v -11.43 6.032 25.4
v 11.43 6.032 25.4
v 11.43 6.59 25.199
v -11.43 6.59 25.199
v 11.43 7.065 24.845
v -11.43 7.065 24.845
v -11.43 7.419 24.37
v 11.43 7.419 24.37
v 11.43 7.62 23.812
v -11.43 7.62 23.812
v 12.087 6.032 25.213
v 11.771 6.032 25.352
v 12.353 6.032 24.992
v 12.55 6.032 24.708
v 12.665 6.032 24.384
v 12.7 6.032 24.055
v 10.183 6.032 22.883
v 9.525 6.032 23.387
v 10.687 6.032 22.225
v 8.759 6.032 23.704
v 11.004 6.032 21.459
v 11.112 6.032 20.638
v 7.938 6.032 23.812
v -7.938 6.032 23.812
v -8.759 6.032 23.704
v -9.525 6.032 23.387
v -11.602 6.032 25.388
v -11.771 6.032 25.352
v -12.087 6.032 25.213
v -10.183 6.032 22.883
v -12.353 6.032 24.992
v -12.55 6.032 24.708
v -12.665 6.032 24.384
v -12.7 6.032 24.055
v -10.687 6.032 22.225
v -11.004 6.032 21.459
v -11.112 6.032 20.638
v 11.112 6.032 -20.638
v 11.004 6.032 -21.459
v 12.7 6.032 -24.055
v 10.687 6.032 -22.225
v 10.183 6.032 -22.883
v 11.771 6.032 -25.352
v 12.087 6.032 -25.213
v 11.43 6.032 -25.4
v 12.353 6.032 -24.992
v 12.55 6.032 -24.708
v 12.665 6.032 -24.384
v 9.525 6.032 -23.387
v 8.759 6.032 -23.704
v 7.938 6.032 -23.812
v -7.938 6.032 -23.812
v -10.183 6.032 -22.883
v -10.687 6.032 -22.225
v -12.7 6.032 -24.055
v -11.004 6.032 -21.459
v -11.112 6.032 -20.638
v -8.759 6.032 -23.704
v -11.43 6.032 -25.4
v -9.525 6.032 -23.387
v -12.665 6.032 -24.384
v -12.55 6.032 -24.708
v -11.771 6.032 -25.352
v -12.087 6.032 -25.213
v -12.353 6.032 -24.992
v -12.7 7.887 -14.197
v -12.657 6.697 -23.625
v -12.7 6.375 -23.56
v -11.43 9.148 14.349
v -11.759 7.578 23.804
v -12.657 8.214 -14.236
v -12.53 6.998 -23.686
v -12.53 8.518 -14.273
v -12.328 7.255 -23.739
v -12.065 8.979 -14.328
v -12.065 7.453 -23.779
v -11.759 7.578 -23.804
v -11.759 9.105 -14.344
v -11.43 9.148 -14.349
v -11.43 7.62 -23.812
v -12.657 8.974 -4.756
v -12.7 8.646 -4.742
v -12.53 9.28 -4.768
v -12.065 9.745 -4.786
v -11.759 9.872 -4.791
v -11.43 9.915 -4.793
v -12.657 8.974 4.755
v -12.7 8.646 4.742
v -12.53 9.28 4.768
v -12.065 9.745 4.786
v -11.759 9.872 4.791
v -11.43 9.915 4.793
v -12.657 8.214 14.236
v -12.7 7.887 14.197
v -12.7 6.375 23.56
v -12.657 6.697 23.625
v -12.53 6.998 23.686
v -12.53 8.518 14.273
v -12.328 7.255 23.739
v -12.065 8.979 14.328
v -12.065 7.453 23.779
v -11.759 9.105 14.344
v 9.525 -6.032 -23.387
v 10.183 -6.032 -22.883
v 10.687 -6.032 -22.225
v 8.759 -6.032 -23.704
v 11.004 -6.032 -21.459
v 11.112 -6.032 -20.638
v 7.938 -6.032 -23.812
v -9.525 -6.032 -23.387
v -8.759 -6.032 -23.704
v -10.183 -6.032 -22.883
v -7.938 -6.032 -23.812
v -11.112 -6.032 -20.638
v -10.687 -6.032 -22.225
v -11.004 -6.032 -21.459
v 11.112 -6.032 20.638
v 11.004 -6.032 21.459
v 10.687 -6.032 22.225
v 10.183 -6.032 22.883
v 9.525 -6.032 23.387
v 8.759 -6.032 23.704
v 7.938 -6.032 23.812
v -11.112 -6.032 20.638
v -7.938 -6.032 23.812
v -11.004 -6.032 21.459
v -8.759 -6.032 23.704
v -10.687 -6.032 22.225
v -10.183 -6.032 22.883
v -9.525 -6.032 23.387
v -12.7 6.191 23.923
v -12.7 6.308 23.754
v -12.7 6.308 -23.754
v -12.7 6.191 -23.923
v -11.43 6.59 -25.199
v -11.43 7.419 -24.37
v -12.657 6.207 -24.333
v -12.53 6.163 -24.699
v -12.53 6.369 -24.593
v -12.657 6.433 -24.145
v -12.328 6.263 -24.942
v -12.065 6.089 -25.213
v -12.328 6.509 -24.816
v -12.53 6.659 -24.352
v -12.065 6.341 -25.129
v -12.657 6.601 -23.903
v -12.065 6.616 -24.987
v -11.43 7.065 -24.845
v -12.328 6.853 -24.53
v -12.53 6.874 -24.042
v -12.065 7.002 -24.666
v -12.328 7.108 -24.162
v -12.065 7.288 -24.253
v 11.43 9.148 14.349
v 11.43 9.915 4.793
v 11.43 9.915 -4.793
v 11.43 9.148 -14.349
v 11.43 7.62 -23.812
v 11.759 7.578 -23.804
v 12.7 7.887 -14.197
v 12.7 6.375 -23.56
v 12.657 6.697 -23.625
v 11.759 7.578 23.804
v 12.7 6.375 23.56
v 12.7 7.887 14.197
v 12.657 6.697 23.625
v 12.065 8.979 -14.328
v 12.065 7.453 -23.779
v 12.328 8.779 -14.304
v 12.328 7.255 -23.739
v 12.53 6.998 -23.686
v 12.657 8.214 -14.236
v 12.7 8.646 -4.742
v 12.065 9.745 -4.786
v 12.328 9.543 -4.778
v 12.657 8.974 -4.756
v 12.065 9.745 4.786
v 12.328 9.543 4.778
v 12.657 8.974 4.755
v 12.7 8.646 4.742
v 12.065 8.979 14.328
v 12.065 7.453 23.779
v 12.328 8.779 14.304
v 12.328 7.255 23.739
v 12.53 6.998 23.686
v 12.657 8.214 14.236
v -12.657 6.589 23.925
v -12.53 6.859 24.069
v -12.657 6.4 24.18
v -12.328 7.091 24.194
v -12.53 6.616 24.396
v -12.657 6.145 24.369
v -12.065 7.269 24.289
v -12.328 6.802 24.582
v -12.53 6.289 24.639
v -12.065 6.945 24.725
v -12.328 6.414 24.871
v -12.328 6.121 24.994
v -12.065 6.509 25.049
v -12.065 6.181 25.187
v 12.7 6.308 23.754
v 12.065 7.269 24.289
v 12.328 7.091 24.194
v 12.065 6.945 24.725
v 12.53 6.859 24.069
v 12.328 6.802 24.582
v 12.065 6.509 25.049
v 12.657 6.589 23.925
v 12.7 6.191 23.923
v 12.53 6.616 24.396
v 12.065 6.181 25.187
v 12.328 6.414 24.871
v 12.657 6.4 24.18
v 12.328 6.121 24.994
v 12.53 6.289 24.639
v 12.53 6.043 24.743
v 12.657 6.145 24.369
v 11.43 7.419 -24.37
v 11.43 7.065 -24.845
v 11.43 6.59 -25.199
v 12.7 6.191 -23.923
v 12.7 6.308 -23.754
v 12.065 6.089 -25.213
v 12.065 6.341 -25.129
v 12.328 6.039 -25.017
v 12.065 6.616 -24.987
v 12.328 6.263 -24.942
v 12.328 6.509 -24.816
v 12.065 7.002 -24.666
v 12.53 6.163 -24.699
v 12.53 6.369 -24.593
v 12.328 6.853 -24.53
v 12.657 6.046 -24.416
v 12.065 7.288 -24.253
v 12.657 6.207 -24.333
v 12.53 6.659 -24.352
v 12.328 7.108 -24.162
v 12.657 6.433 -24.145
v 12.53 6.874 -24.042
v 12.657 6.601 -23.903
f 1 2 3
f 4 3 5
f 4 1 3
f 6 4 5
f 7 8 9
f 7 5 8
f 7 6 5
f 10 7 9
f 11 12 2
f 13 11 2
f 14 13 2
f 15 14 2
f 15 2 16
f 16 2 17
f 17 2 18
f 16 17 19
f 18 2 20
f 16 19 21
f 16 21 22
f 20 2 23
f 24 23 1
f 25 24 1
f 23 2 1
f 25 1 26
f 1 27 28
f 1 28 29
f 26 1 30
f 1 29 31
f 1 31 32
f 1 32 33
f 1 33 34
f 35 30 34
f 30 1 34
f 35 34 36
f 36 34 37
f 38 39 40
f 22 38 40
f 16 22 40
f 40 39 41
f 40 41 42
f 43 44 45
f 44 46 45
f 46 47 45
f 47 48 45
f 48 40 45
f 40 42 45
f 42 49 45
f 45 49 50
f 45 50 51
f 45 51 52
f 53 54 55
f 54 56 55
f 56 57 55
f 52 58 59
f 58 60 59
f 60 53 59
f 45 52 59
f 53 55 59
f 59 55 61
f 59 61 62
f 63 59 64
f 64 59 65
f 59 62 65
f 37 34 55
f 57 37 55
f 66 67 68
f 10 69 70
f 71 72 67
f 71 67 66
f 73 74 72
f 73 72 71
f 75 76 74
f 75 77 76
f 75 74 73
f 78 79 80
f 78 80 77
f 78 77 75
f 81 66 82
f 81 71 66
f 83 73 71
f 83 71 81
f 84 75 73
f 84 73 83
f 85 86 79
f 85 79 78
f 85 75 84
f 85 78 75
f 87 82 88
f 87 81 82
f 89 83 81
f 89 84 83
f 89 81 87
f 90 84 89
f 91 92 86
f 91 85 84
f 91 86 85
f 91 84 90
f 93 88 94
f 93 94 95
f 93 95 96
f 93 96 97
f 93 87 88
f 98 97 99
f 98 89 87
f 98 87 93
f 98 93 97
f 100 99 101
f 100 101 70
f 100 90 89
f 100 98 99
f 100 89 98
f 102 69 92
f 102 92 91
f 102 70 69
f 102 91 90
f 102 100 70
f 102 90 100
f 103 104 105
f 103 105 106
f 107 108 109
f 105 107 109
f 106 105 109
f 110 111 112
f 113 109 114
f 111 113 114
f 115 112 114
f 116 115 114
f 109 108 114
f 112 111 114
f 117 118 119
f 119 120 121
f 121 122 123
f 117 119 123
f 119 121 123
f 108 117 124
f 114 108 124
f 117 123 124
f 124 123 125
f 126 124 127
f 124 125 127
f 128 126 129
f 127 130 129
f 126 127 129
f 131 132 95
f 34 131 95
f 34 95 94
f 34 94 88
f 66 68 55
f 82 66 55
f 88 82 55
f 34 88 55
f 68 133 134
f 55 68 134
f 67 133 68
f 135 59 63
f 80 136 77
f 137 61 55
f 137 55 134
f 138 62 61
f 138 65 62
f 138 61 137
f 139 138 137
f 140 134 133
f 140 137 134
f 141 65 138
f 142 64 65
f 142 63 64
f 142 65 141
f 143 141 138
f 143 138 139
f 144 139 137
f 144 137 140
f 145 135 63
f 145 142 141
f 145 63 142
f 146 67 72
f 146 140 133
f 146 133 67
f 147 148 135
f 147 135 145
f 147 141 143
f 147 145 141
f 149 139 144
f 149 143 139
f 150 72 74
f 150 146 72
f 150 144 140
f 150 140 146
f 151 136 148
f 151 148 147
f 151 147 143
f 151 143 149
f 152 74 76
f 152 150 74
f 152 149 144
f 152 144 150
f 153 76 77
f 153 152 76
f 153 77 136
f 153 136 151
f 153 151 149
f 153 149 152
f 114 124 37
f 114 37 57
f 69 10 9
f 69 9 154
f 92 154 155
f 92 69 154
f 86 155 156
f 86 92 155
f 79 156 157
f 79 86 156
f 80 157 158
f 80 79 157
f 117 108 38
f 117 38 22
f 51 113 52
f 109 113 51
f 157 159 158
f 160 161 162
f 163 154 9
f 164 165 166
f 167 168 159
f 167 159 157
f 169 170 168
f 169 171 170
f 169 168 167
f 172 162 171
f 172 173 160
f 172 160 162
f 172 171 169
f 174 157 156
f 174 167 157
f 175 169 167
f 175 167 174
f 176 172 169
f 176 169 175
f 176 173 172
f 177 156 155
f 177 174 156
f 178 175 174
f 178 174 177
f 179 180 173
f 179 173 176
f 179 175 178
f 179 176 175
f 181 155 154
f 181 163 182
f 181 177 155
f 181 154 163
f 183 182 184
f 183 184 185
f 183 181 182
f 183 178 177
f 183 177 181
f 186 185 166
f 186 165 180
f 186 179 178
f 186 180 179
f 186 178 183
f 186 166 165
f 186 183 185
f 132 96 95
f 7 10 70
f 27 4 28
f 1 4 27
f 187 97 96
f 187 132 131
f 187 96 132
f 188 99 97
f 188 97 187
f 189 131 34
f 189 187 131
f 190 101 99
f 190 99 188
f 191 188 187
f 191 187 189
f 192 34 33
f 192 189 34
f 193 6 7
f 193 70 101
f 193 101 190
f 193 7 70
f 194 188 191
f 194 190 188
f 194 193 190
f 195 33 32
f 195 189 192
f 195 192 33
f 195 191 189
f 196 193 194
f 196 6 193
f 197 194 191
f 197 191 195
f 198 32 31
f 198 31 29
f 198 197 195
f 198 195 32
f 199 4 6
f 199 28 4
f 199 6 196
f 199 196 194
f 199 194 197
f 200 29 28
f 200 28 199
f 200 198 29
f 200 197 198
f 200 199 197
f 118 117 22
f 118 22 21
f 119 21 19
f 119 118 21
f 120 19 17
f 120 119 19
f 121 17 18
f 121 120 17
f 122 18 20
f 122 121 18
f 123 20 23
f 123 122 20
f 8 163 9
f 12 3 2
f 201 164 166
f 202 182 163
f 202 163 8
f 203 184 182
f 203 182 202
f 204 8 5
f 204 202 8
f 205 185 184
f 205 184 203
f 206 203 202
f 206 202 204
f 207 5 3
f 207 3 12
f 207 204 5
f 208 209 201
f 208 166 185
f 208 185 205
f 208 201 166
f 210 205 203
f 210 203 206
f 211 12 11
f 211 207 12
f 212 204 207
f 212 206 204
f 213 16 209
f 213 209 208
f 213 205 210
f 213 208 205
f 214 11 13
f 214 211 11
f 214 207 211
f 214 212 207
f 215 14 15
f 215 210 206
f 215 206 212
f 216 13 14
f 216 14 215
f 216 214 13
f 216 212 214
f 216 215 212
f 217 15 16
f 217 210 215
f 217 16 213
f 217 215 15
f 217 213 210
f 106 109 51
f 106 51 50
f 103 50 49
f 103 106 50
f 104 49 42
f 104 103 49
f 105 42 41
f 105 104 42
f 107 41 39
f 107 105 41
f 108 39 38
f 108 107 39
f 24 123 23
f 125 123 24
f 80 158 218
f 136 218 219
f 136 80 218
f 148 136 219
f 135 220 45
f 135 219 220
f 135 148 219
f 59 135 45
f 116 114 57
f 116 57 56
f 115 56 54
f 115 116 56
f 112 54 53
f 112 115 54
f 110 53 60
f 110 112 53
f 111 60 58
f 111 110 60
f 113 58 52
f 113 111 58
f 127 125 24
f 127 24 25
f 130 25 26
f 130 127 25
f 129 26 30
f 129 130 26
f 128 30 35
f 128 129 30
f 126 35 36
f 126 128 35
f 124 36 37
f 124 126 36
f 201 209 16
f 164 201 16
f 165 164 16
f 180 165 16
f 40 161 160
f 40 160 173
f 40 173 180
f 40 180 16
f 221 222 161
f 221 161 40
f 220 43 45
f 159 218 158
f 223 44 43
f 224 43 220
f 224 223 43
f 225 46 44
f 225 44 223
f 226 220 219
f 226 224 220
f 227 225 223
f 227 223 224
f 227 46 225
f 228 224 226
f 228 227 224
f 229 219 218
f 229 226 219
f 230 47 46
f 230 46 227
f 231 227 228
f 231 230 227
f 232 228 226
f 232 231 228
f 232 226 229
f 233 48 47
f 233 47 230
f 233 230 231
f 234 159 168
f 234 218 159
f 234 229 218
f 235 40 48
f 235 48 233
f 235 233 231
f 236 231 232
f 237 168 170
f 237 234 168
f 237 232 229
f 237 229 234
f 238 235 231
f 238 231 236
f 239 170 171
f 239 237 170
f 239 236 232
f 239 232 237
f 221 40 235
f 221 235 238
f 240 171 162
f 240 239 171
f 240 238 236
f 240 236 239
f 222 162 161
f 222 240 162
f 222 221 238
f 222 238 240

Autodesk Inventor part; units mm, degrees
ref_plane "YZ Plane" through (0, 0, 0) normal (1, 0, 0) x (0, 1, 0)
ref_plane "XZ Plane" through (0, 0, 0) normal (0, 1, 0) x (-1, 0, 0)
ref_plane "XY Plane" through (0, 0, 0) normal (0, 0, 1) x (1, 0, 0)
sketch "Sketch1" plane through (0, 0, 0) normal (0, 1, 0) x (-1, 0, 0)
  line L0 (-7.9375, 23.8125) -> (7.9375, 23.8125)
  line L1 (11.1125, 20.6375) -> (11.1125, -20.6375)
  line L2 (7.9375, -23.8125) -> (-7.9375, -23.8125)
  line L3 (-11.1125, -20.6375) -> (-11.1125, 20.6375)
  line L4 (-11.1125, 23.8125) -> (11.1125, -23.8125) construction
  line L5 (11.1125, 23.8125) -> (-11.1125, -23.8125) construction
  arc A0 (7.9375, -23.8125) -> (11.1125, -20.6375) centre (7.9375, -20.6375) ccw
  arc A1 (-11.1125, -20.6375) -> (-7.9375, -23.8125) centre (-7.9375, -20.6375) ccw
  arc A2 (-7.9375, 23.8125) -> (-11.1125, 20.6375) centre (-7.9375, 20.6375) ccw
  arc A3 (11.1125, 20.6375) -> (7.9375, 23.8125) centre (7.9375, 20.6375) ccw
  point P0 (0, 0)
  dimension "d0" = 47.625
  dimension "d1" = 22.225
  dimension "d15" = 3.175
extrude "Extrusion1" add sketch "Sketch1" along normal mid plane 12.065
sketch "Sketch3" plane through (0, -6.0325, -23.8125) normal (1, 0, 0) x (0, 0, -1)
  line L0 (-44.45, 12.065) -> (-3.175, 12.065) projected
  line L1 (-3.175, 0) -> (-44.45, 0) projected
  line L2 (-49.2125, 12.065) -> (1.5875, 12.065)
  arc A0 (-47.625, 13.6525) -> (-49.2125, 12.065) centre (-47.2211, 11.6611) ccw
  arc A1 (1.5875, 12.065) -> (0, 13.6525) centre (-0.4039, 11.6611) ccw
  arc A2 (0, 13.6525) -> (-47.625, 13.6525) centre (-23.8125, -103.7429) ccw
  line L3 (-3.175, 12.065) -> (-3.175, 0) projected
  line L4 (-44.45, 12.065) -> (-44.45, 0) projected
  point P0 (-23.8125, 6.0325)
  point P1 (-47.625, 12.065)
  dimension "d5" = 50.8
  dimension "d9" = 1.5875
  dimension "d13" = 2.032
  dimension "d14" = 2.032
extrude "Extrusion2" add sketch "Sketch3" along normal mid plane 25.4 contours L2 A0 A2 A1 L0
fillet "Fillet1" radius 1.27 6 edges at (-12.7, 7.0654, -24.8454) (-12.7, 7.0654, 24.8454) (-12.7, 10.0107, 0) (12.7, 7.0654, 24.8454) (12.7, 7.0654, -24.8454) (12.7, 10.0107, 0)
properties part number "ARM_029_BottomIntakeSide_Cap" material "ABS Plastic"
